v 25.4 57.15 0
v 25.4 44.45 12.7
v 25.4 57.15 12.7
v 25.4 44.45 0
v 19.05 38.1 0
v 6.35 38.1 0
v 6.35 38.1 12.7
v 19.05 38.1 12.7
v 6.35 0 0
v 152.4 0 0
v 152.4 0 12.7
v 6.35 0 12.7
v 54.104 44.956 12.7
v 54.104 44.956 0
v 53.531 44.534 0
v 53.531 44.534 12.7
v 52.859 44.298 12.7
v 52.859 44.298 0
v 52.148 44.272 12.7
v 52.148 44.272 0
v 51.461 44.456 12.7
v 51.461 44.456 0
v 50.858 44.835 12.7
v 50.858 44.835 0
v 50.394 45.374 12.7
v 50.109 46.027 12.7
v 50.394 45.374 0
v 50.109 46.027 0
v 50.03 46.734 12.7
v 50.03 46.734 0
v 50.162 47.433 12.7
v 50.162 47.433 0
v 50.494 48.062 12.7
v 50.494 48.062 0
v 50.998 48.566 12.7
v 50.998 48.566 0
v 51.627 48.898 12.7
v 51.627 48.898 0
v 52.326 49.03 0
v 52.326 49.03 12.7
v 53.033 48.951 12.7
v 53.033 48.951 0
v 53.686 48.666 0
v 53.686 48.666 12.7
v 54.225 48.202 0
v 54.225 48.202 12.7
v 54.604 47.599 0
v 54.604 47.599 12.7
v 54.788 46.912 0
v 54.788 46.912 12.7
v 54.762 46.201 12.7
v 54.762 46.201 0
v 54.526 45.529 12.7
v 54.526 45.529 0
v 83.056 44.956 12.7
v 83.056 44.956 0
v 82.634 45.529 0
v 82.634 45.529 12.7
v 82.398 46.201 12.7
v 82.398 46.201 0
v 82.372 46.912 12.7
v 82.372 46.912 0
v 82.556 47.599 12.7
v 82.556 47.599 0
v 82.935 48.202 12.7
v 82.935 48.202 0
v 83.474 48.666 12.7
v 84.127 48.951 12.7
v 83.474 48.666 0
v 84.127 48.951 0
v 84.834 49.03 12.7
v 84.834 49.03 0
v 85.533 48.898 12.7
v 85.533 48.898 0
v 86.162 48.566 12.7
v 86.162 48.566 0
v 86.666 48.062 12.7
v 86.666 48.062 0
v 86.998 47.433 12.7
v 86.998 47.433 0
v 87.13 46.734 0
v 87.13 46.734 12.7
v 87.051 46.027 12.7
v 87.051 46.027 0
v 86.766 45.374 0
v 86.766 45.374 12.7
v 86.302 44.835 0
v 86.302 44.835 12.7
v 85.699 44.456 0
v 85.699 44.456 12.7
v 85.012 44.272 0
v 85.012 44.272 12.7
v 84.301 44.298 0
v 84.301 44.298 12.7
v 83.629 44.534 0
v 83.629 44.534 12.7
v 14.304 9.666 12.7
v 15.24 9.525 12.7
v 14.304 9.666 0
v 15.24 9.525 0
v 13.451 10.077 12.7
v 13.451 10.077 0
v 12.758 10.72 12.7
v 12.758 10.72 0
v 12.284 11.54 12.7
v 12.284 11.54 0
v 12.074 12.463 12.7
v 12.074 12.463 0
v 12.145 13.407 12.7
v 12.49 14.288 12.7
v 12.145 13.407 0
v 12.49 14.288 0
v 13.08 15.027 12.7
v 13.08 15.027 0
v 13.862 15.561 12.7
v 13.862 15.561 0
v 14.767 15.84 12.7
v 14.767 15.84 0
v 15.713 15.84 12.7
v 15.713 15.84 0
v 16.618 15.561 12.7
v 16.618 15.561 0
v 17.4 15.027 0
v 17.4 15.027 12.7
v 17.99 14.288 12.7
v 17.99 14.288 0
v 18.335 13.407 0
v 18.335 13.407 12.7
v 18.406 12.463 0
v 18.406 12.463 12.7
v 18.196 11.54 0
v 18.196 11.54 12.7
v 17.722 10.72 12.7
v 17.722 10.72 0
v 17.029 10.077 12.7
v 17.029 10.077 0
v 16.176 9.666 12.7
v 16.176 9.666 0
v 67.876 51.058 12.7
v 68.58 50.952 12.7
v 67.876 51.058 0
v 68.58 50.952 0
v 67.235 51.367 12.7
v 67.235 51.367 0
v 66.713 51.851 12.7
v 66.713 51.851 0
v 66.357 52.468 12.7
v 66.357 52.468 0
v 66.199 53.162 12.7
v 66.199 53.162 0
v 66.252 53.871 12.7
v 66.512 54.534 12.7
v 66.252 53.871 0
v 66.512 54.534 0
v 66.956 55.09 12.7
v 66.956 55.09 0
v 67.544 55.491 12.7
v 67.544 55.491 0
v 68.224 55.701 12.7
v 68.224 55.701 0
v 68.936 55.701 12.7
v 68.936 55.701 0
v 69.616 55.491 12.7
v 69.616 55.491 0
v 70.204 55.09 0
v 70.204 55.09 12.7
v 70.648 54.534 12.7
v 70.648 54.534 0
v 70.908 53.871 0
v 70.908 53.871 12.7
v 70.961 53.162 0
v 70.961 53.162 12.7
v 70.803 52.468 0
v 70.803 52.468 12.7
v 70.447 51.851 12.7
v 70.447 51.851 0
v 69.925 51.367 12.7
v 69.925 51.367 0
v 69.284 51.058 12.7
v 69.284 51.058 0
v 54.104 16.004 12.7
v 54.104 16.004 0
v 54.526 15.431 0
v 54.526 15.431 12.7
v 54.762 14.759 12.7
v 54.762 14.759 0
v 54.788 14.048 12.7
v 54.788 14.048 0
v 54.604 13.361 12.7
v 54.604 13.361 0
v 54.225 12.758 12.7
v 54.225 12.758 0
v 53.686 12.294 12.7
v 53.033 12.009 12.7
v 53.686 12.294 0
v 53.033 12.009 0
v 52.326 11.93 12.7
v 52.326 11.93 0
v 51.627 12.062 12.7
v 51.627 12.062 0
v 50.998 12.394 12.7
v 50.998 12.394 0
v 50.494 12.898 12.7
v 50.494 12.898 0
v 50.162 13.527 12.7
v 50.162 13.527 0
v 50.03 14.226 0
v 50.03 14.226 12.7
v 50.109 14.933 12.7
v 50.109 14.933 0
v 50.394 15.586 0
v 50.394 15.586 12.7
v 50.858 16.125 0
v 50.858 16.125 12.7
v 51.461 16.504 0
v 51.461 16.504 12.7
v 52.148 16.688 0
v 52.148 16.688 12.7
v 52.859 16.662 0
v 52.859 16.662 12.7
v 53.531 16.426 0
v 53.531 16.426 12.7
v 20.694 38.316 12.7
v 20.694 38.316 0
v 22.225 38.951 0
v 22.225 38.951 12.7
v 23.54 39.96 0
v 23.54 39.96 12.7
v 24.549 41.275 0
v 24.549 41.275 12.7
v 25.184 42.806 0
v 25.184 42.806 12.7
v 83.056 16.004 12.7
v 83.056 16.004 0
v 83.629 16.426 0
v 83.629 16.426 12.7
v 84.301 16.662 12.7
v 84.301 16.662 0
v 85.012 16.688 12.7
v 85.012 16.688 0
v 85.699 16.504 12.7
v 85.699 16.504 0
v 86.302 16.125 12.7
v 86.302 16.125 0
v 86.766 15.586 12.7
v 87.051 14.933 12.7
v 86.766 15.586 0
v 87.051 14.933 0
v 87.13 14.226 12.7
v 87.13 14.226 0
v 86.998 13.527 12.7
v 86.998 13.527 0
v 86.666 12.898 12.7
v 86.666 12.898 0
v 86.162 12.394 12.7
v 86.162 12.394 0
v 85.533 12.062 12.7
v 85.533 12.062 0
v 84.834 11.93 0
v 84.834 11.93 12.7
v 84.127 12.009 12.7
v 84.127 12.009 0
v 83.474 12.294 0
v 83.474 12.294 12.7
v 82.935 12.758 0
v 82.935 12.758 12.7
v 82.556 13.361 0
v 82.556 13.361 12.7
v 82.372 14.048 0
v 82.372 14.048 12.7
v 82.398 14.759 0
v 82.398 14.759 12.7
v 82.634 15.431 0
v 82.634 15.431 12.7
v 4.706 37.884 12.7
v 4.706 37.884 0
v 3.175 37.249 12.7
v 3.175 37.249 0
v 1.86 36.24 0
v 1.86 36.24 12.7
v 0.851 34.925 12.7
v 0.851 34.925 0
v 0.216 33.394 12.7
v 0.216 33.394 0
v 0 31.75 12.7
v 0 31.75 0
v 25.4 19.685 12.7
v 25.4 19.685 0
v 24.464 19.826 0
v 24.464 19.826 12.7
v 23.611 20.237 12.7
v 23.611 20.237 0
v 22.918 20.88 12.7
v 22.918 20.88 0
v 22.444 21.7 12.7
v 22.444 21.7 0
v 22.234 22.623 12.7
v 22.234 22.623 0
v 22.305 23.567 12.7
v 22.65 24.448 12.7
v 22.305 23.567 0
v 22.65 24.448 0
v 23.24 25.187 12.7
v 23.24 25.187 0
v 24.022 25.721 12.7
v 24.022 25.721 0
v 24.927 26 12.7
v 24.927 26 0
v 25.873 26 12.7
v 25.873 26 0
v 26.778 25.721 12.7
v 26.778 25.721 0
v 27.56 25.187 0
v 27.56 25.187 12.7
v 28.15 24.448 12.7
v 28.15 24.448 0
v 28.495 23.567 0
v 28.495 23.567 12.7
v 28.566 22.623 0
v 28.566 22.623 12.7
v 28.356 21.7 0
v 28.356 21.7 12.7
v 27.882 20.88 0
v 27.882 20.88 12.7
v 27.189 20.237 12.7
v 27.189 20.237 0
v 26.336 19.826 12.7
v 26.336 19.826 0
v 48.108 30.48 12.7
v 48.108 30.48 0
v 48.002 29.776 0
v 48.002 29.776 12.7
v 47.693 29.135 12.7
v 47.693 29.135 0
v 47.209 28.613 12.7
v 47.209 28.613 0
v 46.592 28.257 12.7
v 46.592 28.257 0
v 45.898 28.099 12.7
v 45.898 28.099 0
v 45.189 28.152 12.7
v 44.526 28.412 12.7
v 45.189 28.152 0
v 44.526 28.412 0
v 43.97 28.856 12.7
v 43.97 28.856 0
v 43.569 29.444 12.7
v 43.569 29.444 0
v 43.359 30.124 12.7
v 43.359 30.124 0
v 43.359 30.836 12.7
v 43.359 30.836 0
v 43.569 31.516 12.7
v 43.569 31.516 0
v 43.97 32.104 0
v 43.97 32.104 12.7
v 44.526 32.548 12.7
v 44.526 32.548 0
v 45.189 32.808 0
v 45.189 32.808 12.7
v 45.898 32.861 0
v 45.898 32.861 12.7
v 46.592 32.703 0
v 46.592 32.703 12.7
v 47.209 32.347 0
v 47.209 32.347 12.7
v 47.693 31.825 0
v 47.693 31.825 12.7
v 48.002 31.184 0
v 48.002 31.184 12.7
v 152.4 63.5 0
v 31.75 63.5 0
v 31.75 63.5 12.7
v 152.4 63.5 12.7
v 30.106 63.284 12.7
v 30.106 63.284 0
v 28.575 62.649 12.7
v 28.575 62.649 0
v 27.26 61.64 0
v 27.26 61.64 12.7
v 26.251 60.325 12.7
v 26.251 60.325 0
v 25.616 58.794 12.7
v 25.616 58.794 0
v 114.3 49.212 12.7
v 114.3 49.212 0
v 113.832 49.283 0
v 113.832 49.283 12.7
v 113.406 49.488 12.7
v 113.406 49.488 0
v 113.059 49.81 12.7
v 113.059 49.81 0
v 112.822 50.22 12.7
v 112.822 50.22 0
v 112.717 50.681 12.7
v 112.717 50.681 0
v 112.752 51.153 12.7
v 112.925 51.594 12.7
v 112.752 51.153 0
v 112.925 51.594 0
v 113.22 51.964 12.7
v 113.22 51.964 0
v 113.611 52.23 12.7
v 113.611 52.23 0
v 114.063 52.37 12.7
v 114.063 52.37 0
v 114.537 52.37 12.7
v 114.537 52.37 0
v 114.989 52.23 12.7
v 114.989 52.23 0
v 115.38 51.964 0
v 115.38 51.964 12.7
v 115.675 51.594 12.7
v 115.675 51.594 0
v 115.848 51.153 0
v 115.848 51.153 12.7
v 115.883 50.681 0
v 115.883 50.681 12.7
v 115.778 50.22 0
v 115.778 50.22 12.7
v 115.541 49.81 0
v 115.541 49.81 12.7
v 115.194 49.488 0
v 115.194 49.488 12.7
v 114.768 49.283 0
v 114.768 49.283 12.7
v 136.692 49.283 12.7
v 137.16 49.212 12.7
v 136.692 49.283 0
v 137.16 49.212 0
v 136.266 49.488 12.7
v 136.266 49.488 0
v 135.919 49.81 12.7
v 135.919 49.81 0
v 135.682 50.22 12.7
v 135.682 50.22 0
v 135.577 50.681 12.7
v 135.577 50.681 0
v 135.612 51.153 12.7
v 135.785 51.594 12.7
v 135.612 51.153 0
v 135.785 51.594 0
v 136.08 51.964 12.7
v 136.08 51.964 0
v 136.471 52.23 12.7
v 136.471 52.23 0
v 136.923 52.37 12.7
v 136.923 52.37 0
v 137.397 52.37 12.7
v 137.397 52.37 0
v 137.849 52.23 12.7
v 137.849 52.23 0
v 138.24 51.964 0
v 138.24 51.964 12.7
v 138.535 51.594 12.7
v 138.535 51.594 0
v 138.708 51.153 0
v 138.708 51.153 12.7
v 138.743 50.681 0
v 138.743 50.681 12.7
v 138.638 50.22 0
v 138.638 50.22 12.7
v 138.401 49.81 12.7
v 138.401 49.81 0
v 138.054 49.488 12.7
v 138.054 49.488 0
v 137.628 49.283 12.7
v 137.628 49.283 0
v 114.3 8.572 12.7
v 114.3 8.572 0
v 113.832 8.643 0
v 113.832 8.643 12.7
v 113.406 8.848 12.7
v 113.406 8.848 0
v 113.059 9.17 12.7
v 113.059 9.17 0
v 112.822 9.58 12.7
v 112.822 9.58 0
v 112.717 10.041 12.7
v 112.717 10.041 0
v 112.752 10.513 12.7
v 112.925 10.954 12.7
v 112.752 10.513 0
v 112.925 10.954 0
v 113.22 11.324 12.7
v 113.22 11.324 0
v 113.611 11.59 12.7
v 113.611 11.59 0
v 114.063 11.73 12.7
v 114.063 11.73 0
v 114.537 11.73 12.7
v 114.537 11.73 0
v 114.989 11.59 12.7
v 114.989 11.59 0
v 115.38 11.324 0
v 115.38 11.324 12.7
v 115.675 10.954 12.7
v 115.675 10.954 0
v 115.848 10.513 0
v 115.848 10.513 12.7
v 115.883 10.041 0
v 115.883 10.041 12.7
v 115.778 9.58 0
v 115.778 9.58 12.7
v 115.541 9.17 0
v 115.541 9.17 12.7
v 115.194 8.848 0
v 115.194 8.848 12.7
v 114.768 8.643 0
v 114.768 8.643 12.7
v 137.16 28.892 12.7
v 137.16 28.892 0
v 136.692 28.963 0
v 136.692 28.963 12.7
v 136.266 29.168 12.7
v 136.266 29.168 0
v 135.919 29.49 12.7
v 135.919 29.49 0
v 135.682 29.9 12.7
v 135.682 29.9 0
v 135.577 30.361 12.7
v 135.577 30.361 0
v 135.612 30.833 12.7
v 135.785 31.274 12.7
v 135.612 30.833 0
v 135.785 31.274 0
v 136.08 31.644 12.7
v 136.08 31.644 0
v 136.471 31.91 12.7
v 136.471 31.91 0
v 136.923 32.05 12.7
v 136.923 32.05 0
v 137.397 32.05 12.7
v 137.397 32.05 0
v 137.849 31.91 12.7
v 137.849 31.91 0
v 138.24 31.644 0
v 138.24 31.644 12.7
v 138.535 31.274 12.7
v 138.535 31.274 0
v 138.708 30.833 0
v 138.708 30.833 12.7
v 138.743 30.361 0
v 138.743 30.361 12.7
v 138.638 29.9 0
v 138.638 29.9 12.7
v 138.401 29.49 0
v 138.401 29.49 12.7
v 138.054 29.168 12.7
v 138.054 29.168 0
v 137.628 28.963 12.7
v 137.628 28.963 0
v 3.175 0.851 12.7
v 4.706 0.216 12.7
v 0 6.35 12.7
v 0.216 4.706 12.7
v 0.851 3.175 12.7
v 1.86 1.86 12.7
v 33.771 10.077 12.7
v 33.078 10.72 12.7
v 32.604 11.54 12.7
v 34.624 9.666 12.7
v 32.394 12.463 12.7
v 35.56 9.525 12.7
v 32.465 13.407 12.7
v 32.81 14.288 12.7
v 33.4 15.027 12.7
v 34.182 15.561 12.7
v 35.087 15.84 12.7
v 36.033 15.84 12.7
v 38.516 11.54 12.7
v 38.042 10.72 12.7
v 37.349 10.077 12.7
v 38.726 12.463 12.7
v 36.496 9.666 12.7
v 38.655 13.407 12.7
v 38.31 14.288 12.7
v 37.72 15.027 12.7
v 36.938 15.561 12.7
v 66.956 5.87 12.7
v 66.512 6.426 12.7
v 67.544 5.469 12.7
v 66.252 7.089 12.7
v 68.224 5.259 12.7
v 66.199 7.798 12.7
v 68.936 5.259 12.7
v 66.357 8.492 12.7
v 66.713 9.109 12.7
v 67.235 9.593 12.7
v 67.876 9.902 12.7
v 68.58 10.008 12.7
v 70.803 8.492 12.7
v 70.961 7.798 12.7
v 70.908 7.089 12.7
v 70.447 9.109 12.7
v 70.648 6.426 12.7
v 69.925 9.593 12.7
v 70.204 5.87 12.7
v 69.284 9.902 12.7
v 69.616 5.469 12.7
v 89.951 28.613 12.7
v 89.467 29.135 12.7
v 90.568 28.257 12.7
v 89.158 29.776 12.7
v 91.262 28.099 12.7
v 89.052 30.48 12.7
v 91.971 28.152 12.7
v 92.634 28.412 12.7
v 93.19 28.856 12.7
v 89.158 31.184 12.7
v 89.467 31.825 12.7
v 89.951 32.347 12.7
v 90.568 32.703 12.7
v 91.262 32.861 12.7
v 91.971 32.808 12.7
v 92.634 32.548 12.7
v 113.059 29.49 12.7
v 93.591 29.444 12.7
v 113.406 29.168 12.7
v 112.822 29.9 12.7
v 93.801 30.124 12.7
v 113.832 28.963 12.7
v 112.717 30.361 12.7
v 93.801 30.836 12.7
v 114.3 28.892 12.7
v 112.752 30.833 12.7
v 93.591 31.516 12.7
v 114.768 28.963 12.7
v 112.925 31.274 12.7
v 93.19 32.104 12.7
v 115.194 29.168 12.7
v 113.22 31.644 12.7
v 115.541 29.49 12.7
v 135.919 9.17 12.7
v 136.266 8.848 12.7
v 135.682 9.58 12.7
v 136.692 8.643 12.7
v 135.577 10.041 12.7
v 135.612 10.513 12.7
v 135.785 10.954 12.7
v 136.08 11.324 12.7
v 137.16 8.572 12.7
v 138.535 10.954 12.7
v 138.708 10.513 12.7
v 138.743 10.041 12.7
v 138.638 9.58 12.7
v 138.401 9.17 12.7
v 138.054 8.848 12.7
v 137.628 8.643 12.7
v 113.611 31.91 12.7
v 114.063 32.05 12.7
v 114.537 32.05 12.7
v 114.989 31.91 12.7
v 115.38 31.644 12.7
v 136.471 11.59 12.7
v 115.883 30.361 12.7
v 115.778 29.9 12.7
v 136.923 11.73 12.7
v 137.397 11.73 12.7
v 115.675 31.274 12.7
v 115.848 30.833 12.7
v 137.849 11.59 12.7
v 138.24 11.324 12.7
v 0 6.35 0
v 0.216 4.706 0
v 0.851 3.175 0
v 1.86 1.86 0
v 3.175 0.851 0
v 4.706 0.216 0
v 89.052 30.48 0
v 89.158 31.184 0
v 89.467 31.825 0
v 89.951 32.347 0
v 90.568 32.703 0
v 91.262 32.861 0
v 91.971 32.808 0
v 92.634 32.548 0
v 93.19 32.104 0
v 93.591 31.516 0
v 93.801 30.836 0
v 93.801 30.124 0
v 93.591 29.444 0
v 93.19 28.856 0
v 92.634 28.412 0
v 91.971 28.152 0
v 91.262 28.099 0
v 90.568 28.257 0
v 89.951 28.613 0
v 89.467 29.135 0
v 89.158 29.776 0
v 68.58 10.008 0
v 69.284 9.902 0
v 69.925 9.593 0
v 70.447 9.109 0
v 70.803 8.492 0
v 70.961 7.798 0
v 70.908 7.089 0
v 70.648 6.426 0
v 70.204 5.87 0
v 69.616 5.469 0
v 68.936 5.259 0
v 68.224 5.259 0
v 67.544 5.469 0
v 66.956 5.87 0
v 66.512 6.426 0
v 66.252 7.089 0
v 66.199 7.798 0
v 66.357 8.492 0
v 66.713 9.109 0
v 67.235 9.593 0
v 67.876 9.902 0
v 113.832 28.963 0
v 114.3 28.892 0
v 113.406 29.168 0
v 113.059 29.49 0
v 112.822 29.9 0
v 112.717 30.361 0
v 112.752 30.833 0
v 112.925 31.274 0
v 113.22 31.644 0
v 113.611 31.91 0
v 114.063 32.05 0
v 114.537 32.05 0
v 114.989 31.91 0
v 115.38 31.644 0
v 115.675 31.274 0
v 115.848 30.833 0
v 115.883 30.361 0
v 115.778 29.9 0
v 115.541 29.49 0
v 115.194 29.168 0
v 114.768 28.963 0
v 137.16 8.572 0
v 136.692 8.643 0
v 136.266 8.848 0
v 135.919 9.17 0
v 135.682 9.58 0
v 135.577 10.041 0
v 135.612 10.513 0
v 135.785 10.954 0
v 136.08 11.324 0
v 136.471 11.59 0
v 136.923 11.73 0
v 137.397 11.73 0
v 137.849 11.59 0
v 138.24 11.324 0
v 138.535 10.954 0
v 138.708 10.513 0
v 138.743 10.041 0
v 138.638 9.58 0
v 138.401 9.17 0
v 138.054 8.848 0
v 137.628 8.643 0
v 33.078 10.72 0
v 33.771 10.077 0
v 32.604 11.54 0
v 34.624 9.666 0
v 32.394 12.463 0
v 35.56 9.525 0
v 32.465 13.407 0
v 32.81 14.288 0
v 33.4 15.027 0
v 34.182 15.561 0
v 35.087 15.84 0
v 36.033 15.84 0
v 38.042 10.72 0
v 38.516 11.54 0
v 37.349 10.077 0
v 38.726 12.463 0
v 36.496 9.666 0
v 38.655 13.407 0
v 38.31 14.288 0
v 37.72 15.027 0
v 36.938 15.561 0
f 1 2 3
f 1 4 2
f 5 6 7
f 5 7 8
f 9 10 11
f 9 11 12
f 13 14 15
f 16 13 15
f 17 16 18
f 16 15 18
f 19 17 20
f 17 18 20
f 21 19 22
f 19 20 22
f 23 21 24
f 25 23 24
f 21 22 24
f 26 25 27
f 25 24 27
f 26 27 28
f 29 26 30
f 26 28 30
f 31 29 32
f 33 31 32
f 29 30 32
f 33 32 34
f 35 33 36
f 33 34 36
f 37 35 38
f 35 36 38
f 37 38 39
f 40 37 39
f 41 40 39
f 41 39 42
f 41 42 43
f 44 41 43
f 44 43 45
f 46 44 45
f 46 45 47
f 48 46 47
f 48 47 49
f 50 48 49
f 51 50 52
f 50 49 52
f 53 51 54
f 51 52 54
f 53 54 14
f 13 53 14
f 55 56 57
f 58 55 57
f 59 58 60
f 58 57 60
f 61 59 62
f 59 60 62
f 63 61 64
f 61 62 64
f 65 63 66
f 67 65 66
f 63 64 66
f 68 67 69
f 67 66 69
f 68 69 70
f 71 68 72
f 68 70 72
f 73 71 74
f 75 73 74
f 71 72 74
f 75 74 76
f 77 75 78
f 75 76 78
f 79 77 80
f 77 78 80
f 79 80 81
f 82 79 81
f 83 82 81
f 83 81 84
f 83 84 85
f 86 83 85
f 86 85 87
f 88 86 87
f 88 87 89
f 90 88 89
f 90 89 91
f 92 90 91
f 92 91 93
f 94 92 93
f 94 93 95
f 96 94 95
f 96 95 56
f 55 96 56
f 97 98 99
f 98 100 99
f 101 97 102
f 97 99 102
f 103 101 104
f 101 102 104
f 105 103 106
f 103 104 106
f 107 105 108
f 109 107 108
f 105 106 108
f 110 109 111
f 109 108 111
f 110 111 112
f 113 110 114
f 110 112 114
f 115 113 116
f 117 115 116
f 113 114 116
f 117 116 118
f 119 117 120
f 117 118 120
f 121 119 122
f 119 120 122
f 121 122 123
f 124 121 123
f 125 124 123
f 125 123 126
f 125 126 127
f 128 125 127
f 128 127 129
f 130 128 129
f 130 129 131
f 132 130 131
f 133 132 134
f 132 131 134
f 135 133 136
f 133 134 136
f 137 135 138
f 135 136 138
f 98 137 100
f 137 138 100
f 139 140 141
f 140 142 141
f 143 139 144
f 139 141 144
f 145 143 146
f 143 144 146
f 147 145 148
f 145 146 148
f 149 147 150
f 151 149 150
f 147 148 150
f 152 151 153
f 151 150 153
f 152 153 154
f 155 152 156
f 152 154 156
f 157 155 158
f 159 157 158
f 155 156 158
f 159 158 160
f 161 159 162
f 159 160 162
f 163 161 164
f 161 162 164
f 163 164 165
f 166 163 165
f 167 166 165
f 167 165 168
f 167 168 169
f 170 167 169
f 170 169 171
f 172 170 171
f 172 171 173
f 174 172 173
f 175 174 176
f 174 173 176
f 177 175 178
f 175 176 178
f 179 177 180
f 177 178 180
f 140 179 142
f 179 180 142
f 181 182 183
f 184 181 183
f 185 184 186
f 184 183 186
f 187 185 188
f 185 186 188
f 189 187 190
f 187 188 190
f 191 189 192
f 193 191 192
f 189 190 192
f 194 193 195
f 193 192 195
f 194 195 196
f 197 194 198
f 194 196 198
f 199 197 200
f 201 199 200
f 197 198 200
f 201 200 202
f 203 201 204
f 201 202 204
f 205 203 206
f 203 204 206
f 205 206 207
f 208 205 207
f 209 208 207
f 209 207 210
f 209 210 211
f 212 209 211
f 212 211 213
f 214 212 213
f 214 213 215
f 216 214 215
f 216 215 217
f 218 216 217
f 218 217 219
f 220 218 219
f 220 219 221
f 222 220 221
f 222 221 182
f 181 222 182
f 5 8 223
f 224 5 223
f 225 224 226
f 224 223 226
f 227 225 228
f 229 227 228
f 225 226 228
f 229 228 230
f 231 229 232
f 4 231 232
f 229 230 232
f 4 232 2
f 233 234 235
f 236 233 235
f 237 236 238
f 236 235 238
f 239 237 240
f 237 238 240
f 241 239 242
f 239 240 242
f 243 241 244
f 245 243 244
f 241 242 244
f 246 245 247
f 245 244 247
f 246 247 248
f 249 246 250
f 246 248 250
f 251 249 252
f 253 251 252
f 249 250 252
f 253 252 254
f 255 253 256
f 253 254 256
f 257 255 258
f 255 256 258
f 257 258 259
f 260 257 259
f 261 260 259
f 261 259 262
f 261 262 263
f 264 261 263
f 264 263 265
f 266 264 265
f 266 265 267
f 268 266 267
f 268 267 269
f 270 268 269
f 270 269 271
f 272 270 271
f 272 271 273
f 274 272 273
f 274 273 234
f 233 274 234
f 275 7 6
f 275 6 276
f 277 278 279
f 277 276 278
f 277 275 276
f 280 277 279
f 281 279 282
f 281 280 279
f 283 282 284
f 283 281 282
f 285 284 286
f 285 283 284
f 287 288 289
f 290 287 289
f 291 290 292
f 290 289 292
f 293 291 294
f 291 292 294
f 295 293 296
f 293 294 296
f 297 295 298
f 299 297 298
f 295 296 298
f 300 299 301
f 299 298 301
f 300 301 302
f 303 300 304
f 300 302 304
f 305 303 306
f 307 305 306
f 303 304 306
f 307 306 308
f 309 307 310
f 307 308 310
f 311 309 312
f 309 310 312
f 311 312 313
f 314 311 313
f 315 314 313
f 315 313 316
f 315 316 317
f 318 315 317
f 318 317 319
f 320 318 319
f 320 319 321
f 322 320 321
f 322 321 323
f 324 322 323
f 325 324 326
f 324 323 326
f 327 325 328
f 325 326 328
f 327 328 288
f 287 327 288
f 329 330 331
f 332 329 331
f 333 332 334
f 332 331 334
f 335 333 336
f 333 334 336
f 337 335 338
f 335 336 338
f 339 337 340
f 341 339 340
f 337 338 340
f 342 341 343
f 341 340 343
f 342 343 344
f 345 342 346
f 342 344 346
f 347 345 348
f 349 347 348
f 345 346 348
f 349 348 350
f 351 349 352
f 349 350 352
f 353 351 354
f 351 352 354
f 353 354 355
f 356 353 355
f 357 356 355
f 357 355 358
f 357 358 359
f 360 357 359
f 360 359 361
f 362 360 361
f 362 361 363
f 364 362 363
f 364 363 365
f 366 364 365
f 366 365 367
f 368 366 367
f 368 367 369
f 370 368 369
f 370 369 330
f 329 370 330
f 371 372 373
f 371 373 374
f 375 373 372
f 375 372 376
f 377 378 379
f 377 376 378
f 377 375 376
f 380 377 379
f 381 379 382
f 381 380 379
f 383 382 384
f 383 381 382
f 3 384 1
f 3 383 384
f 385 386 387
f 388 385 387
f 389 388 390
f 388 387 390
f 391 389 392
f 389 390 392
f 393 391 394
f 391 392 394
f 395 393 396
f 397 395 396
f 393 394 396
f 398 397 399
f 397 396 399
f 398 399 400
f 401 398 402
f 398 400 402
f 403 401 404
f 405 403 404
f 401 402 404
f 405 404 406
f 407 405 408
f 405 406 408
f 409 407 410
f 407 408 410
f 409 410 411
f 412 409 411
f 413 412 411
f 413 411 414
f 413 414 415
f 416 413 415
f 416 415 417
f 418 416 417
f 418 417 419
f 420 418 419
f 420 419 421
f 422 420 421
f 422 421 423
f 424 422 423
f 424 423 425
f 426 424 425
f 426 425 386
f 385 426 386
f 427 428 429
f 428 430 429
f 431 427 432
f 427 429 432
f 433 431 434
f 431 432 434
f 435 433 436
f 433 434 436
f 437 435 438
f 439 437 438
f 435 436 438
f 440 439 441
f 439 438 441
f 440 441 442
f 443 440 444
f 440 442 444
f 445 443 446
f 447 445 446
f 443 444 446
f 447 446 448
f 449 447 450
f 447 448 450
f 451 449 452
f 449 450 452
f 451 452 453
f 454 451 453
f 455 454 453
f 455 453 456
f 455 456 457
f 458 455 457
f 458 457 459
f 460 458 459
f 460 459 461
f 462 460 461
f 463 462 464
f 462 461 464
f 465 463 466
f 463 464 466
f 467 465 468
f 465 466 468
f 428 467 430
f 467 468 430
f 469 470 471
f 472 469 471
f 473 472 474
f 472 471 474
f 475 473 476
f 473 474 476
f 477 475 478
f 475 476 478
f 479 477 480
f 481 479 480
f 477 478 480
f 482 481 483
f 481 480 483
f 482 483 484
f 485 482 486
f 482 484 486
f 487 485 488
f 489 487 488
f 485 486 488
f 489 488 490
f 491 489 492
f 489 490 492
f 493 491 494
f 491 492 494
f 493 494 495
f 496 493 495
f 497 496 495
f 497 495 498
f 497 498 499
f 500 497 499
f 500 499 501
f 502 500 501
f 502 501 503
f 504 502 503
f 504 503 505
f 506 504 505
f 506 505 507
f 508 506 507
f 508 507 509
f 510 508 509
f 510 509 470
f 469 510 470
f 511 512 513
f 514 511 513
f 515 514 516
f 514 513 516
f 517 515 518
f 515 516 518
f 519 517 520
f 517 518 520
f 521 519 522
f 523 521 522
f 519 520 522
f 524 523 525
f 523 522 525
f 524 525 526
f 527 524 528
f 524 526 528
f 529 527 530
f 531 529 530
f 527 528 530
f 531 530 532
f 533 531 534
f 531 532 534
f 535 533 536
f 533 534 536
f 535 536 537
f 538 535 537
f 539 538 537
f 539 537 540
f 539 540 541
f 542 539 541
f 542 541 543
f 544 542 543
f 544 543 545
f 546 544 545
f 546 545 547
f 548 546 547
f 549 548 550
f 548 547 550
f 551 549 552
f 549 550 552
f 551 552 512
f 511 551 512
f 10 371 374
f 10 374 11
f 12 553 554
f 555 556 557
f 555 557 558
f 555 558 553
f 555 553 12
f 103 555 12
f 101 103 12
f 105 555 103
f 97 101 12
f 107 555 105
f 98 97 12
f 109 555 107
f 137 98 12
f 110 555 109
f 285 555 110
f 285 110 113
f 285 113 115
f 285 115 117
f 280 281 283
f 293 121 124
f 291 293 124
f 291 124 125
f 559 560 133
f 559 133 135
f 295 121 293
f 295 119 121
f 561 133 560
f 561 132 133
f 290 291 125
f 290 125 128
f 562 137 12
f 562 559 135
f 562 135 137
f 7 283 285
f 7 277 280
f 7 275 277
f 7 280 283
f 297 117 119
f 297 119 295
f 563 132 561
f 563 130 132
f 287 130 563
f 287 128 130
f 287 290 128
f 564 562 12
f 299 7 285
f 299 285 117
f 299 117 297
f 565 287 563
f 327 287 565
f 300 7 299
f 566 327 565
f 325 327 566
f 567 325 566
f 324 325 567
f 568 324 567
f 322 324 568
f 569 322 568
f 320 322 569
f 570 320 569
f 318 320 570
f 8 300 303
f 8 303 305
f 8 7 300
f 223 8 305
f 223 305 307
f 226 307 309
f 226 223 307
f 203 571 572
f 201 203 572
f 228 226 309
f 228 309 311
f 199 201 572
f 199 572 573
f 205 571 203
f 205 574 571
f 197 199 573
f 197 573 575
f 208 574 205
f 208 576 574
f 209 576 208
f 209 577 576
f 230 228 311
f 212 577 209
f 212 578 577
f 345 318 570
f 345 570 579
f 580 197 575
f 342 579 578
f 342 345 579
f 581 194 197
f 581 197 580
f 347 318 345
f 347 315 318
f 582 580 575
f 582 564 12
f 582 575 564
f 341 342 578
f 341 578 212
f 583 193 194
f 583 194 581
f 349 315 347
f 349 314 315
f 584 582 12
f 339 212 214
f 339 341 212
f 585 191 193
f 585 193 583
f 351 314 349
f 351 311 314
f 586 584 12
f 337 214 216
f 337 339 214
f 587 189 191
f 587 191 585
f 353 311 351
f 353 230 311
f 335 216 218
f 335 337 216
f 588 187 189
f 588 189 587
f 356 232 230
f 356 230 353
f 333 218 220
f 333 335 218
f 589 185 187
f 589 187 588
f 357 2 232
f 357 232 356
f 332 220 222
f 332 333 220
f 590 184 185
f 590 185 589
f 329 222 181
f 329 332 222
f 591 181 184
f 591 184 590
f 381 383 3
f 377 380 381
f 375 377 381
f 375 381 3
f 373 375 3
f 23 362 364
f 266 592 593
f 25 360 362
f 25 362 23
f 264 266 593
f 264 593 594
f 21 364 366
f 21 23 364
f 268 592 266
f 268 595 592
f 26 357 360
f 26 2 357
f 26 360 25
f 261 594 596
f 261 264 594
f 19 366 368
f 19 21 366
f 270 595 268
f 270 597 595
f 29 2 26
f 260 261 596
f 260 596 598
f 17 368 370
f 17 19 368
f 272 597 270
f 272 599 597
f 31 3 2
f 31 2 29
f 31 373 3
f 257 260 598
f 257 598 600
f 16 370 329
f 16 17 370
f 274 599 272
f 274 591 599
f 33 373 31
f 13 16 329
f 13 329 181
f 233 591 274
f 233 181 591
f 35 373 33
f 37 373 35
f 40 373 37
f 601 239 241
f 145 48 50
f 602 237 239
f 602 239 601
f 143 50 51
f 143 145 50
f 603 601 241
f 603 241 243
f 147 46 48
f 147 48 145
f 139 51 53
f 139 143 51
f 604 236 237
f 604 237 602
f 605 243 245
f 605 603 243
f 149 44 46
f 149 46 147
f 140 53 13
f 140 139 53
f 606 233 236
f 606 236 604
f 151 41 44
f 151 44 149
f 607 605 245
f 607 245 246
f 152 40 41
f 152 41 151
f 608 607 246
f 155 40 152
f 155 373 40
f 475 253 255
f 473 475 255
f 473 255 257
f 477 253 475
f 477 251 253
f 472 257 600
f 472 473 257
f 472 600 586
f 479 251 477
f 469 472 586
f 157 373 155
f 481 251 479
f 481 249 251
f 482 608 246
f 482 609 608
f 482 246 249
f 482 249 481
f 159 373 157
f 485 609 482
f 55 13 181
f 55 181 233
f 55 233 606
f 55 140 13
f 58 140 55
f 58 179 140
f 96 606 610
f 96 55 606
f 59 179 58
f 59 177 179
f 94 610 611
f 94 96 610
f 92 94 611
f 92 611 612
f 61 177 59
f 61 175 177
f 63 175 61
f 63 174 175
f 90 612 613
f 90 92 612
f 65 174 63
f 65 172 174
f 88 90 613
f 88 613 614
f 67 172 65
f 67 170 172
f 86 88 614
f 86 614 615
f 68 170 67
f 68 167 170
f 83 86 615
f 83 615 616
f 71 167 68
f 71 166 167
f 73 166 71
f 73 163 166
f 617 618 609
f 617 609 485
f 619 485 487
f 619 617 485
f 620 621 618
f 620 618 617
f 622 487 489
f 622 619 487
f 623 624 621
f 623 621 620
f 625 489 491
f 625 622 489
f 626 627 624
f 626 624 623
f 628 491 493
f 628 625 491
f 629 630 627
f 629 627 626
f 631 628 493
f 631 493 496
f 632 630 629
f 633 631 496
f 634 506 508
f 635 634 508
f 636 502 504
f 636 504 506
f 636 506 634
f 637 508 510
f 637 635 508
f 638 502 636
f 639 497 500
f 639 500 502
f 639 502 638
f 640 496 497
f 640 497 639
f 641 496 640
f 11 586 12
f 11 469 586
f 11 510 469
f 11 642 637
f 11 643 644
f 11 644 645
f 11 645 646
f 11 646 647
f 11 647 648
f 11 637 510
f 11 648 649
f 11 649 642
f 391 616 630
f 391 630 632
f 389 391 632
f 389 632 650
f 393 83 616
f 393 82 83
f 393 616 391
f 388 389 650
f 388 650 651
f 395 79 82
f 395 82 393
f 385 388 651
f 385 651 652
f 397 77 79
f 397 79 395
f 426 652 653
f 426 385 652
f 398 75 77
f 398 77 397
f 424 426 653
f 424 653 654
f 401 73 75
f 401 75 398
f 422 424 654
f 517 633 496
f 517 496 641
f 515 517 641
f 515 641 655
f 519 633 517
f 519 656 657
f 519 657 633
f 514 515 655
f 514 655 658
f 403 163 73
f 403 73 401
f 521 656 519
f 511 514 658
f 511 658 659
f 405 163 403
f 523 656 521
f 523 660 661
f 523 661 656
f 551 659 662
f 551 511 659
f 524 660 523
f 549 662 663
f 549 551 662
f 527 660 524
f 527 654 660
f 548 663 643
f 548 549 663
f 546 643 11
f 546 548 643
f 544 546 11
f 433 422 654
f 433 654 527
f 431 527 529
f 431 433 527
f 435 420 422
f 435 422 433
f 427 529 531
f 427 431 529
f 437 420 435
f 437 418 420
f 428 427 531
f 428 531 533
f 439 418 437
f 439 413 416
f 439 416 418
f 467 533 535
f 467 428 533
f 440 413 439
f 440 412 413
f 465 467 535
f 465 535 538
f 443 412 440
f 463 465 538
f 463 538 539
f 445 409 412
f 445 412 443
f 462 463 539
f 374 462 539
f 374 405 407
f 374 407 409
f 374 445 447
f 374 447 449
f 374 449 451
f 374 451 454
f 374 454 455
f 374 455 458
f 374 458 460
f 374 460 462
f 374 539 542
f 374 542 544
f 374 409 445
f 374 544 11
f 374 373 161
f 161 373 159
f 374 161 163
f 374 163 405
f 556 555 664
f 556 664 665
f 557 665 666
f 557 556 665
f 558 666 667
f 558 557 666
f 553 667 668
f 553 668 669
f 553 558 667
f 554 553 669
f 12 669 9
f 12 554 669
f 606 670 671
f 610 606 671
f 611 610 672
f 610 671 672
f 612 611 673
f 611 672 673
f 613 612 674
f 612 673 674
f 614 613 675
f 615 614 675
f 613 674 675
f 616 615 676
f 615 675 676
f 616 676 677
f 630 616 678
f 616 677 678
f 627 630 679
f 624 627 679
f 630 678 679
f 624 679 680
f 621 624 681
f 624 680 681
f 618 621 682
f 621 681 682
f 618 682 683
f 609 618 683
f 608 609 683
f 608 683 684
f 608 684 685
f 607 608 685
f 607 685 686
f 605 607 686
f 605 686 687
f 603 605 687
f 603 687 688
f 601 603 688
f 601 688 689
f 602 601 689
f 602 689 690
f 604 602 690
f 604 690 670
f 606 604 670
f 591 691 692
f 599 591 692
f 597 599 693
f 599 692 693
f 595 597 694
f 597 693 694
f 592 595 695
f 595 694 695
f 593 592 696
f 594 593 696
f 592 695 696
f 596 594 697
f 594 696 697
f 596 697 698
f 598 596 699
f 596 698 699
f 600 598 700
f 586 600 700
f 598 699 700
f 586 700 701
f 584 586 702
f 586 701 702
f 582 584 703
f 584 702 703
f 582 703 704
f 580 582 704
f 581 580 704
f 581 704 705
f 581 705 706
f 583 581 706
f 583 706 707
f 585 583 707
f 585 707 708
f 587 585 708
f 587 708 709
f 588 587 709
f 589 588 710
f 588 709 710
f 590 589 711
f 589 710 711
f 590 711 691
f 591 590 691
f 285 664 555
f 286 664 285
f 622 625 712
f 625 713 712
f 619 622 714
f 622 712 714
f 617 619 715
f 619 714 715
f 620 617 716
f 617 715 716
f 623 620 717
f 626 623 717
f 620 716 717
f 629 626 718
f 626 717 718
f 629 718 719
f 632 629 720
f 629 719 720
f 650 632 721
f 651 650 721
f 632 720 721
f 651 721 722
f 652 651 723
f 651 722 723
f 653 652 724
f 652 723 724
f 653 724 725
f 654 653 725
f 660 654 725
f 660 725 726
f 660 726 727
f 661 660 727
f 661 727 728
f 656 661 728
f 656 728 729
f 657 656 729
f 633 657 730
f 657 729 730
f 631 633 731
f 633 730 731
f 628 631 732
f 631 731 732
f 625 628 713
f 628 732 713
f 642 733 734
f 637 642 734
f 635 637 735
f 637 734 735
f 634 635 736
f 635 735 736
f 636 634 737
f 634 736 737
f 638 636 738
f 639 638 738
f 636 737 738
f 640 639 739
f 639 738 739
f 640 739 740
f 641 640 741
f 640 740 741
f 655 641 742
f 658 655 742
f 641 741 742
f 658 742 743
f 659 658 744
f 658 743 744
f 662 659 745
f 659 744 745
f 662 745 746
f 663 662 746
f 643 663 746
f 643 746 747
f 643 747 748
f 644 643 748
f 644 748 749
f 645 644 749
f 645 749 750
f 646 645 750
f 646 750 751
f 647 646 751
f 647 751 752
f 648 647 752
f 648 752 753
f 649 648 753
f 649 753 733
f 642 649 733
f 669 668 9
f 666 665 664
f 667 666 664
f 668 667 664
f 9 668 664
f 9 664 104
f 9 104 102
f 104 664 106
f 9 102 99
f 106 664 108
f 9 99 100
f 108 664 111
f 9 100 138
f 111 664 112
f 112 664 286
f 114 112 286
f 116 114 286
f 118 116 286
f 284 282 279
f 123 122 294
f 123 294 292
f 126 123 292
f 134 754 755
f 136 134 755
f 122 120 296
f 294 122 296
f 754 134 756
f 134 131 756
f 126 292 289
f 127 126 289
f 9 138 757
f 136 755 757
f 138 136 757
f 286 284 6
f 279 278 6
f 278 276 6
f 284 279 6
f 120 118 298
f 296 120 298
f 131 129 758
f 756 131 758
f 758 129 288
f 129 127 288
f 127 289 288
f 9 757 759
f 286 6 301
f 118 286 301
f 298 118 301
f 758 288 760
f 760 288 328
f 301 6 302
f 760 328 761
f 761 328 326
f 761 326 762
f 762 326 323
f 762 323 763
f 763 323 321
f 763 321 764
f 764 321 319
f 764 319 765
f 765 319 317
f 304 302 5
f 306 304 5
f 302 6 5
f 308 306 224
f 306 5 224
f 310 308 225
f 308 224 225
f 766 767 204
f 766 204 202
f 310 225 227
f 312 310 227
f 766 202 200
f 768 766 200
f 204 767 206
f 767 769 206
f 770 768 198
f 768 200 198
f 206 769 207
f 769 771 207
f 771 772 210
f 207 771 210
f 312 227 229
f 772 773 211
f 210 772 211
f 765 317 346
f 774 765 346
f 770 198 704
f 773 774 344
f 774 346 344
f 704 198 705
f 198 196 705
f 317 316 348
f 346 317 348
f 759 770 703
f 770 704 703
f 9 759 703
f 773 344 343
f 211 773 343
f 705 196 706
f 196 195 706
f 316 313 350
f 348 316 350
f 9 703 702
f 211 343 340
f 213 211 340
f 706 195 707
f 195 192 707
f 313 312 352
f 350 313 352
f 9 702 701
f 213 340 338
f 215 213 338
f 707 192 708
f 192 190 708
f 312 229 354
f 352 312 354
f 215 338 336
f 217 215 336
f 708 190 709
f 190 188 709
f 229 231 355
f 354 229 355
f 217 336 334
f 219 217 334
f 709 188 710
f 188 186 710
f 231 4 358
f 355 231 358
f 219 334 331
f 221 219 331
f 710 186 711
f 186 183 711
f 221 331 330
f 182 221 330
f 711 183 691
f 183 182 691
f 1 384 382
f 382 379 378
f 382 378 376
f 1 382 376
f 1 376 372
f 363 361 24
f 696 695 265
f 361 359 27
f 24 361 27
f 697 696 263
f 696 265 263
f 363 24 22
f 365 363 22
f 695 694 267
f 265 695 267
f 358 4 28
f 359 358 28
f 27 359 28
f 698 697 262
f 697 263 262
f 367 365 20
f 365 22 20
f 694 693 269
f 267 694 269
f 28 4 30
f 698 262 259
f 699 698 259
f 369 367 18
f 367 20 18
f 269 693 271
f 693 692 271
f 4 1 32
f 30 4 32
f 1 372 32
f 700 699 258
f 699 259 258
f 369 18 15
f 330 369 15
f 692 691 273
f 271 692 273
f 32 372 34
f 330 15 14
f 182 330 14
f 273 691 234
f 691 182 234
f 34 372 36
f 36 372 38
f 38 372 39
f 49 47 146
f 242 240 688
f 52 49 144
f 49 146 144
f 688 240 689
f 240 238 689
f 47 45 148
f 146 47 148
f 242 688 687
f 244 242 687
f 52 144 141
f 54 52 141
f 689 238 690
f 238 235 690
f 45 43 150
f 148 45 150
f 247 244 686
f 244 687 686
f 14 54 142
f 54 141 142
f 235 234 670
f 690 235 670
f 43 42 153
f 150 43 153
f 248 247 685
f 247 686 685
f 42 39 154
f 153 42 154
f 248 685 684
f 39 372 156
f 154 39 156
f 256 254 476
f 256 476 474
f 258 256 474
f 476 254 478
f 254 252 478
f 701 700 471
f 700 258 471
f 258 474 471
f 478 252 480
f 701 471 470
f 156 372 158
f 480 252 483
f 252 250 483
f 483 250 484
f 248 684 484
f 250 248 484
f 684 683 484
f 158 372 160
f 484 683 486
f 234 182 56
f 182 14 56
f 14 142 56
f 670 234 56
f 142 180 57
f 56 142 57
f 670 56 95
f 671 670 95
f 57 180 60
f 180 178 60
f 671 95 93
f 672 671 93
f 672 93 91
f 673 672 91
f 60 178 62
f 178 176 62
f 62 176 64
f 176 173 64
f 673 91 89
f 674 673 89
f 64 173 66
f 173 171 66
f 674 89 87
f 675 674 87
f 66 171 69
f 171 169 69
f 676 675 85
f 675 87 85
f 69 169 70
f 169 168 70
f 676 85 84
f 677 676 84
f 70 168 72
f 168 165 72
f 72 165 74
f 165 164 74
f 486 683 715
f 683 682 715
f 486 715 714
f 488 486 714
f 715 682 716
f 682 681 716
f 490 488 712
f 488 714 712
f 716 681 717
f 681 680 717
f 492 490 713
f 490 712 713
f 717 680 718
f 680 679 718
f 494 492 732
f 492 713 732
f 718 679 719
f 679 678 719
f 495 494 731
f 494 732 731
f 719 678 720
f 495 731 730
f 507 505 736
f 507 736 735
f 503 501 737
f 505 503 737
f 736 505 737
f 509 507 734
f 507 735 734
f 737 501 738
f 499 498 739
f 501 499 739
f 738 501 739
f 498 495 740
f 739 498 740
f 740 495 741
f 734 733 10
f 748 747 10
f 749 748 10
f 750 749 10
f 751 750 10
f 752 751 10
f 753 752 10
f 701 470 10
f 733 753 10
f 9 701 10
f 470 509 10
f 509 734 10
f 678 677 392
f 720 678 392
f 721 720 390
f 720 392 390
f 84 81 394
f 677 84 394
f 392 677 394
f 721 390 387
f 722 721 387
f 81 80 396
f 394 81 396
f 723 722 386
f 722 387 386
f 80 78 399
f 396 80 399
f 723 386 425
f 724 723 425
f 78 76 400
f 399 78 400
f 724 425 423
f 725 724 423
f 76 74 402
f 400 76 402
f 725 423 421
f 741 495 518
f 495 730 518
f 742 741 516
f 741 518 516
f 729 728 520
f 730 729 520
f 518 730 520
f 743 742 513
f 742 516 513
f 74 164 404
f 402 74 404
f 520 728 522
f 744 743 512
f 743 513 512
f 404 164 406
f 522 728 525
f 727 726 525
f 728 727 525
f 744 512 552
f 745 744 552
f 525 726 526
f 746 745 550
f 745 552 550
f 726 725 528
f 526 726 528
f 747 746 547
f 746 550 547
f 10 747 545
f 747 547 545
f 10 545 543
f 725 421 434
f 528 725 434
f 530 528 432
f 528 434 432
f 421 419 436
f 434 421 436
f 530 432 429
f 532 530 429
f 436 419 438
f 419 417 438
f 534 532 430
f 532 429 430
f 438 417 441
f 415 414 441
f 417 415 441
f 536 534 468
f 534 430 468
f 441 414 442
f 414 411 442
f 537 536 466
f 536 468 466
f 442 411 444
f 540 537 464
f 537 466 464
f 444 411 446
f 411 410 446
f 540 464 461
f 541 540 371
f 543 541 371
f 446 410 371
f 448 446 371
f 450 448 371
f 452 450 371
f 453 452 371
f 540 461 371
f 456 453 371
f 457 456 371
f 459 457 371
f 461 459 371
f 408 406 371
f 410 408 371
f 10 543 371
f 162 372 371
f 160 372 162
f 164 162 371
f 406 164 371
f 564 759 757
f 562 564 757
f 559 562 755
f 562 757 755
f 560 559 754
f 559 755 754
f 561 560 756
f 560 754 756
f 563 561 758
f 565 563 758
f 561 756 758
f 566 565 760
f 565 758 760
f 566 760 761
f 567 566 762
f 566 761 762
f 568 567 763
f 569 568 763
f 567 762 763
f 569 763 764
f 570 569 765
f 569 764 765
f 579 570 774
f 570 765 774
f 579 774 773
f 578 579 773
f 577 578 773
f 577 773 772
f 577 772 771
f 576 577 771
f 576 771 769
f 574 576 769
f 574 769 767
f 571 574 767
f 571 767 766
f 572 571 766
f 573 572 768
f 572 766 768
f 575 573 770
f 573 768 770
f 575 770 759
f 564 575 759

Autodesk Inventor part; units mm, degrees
ref_plane "YZ Plane" through (0, 0, 0) normal (1, 0, 0) x (0, 1, 0)
ref_plane "XZ Plane" through (0, 0, 0) normal (0, 1, 0) x (-1, 0, 0)
ref_plane "XY Plane" through (0, 0, 0) normal (0, 0, 1) x (1, 0, 0)
sketch "Sketch1" plane through (0, 0, 0) normal (0, 0, 1) x (1, 0, 0)
  line L0 (0, 0) -> (0, 38.1)
  line L1 (0, 38.1) -> (25.4, 38.1)
  line L2 (25.4, 38.1) -> (25.4, 63.5)
  line L3 (25.4, 63.5) -> (152.4, 63.5)
  line L4 (152.4, 63.5) -> (152.4, 0)
  line L5 (152.4, 0) -> (0, 0)
  dimension "d0" = 152.4
  dimension "d1" = 63.5
  dimension "d2" = 127
  dimension "d3" = 38.1
extrude "Extrusion1" add sketch "Sketch1" along normal blind 12.7
sketch "Sketch2" plane through (0, 0, 12.7) normal (0, 0, 1) x (1, 0, 0)
  line L0 (152.4, 0) -> (152.4, 63.5) projected
  line L1 (15.24, 12.7) -> (35.56, 12.7) construction
  line L2 (0, 0) -> (152.4, 0) construction
  point P0 (25.4, 22.86)
  dimension "d6" = 127
  dimension "d7" = 10.16
  dimension "d8" = 12.7
  dimension "d9" = 10.16
  dimension "d10" = 10.16
hole "Hole1" at (25.4, 22.86, 12.7) at (15.24, 12.7, 12.7) at (35.56, 12.7, 12.7) direction (0, 0, -1) diameter 6.35 end through all
sketch "Sketch3" plane through (0, 0, 12.7) normal (0, 0, 1) x (1, 0, 0)
  circle A0 centre (68.58, 30.48) radius 22.86 construction
  line L0 (152.4, 0) -> (152.4, 63.5) construction
  line L1 (0, 0) -> (152.4, 0) construction
  line L2 (68.58, 30.48) -> (68.58, 55.3501) construction
  point P0 (68.58, 53.34)
  dimension "d18" = 45.72
  dimension "d19" = 83.82
  dimension "d20" = 30.48
hole "Hole2" at (68.58, 53.34, 12.7) direction (0, 0, -1) diameter 4.7752 end through all
pattern_circular "Circular Pattern1" count 8 over 360 about axis through (68.58, 30.48, 12.7) along (0, 0, 1) of "Hole2"
sketch "Sketch4" plane through (0, 0, 12.7) normal (0, 0, 1) x (1, 0, 0)
  line L0 (152.4, 0) -> (152.4, 63.5) construction
  line L1 (0, 0) -> (152.4, 0) projected
  point P0 (114.3, 50.8)
  dimension "d32" = 38.1
  dimension "d37" = 50.8
hole "Hole3" at (114.3, 50.8, 12.7) direction (0, 0, -1) diameter 3.175 end through all
pattern_linear "Rectangular Pattern1" count 2 spacing 22.86 along (1, 0, 0) count 3 spacing 20.32 along (0, -1, 0) of "Hole3"
fillet "Fillet1" radius 6.35 4 edges at (25.4, 38.1, 6.35) (0, 38.1, 6.35) (25.4, 63.5, 6.35) (0, 0, 6.35)
properties part number "Plate"
